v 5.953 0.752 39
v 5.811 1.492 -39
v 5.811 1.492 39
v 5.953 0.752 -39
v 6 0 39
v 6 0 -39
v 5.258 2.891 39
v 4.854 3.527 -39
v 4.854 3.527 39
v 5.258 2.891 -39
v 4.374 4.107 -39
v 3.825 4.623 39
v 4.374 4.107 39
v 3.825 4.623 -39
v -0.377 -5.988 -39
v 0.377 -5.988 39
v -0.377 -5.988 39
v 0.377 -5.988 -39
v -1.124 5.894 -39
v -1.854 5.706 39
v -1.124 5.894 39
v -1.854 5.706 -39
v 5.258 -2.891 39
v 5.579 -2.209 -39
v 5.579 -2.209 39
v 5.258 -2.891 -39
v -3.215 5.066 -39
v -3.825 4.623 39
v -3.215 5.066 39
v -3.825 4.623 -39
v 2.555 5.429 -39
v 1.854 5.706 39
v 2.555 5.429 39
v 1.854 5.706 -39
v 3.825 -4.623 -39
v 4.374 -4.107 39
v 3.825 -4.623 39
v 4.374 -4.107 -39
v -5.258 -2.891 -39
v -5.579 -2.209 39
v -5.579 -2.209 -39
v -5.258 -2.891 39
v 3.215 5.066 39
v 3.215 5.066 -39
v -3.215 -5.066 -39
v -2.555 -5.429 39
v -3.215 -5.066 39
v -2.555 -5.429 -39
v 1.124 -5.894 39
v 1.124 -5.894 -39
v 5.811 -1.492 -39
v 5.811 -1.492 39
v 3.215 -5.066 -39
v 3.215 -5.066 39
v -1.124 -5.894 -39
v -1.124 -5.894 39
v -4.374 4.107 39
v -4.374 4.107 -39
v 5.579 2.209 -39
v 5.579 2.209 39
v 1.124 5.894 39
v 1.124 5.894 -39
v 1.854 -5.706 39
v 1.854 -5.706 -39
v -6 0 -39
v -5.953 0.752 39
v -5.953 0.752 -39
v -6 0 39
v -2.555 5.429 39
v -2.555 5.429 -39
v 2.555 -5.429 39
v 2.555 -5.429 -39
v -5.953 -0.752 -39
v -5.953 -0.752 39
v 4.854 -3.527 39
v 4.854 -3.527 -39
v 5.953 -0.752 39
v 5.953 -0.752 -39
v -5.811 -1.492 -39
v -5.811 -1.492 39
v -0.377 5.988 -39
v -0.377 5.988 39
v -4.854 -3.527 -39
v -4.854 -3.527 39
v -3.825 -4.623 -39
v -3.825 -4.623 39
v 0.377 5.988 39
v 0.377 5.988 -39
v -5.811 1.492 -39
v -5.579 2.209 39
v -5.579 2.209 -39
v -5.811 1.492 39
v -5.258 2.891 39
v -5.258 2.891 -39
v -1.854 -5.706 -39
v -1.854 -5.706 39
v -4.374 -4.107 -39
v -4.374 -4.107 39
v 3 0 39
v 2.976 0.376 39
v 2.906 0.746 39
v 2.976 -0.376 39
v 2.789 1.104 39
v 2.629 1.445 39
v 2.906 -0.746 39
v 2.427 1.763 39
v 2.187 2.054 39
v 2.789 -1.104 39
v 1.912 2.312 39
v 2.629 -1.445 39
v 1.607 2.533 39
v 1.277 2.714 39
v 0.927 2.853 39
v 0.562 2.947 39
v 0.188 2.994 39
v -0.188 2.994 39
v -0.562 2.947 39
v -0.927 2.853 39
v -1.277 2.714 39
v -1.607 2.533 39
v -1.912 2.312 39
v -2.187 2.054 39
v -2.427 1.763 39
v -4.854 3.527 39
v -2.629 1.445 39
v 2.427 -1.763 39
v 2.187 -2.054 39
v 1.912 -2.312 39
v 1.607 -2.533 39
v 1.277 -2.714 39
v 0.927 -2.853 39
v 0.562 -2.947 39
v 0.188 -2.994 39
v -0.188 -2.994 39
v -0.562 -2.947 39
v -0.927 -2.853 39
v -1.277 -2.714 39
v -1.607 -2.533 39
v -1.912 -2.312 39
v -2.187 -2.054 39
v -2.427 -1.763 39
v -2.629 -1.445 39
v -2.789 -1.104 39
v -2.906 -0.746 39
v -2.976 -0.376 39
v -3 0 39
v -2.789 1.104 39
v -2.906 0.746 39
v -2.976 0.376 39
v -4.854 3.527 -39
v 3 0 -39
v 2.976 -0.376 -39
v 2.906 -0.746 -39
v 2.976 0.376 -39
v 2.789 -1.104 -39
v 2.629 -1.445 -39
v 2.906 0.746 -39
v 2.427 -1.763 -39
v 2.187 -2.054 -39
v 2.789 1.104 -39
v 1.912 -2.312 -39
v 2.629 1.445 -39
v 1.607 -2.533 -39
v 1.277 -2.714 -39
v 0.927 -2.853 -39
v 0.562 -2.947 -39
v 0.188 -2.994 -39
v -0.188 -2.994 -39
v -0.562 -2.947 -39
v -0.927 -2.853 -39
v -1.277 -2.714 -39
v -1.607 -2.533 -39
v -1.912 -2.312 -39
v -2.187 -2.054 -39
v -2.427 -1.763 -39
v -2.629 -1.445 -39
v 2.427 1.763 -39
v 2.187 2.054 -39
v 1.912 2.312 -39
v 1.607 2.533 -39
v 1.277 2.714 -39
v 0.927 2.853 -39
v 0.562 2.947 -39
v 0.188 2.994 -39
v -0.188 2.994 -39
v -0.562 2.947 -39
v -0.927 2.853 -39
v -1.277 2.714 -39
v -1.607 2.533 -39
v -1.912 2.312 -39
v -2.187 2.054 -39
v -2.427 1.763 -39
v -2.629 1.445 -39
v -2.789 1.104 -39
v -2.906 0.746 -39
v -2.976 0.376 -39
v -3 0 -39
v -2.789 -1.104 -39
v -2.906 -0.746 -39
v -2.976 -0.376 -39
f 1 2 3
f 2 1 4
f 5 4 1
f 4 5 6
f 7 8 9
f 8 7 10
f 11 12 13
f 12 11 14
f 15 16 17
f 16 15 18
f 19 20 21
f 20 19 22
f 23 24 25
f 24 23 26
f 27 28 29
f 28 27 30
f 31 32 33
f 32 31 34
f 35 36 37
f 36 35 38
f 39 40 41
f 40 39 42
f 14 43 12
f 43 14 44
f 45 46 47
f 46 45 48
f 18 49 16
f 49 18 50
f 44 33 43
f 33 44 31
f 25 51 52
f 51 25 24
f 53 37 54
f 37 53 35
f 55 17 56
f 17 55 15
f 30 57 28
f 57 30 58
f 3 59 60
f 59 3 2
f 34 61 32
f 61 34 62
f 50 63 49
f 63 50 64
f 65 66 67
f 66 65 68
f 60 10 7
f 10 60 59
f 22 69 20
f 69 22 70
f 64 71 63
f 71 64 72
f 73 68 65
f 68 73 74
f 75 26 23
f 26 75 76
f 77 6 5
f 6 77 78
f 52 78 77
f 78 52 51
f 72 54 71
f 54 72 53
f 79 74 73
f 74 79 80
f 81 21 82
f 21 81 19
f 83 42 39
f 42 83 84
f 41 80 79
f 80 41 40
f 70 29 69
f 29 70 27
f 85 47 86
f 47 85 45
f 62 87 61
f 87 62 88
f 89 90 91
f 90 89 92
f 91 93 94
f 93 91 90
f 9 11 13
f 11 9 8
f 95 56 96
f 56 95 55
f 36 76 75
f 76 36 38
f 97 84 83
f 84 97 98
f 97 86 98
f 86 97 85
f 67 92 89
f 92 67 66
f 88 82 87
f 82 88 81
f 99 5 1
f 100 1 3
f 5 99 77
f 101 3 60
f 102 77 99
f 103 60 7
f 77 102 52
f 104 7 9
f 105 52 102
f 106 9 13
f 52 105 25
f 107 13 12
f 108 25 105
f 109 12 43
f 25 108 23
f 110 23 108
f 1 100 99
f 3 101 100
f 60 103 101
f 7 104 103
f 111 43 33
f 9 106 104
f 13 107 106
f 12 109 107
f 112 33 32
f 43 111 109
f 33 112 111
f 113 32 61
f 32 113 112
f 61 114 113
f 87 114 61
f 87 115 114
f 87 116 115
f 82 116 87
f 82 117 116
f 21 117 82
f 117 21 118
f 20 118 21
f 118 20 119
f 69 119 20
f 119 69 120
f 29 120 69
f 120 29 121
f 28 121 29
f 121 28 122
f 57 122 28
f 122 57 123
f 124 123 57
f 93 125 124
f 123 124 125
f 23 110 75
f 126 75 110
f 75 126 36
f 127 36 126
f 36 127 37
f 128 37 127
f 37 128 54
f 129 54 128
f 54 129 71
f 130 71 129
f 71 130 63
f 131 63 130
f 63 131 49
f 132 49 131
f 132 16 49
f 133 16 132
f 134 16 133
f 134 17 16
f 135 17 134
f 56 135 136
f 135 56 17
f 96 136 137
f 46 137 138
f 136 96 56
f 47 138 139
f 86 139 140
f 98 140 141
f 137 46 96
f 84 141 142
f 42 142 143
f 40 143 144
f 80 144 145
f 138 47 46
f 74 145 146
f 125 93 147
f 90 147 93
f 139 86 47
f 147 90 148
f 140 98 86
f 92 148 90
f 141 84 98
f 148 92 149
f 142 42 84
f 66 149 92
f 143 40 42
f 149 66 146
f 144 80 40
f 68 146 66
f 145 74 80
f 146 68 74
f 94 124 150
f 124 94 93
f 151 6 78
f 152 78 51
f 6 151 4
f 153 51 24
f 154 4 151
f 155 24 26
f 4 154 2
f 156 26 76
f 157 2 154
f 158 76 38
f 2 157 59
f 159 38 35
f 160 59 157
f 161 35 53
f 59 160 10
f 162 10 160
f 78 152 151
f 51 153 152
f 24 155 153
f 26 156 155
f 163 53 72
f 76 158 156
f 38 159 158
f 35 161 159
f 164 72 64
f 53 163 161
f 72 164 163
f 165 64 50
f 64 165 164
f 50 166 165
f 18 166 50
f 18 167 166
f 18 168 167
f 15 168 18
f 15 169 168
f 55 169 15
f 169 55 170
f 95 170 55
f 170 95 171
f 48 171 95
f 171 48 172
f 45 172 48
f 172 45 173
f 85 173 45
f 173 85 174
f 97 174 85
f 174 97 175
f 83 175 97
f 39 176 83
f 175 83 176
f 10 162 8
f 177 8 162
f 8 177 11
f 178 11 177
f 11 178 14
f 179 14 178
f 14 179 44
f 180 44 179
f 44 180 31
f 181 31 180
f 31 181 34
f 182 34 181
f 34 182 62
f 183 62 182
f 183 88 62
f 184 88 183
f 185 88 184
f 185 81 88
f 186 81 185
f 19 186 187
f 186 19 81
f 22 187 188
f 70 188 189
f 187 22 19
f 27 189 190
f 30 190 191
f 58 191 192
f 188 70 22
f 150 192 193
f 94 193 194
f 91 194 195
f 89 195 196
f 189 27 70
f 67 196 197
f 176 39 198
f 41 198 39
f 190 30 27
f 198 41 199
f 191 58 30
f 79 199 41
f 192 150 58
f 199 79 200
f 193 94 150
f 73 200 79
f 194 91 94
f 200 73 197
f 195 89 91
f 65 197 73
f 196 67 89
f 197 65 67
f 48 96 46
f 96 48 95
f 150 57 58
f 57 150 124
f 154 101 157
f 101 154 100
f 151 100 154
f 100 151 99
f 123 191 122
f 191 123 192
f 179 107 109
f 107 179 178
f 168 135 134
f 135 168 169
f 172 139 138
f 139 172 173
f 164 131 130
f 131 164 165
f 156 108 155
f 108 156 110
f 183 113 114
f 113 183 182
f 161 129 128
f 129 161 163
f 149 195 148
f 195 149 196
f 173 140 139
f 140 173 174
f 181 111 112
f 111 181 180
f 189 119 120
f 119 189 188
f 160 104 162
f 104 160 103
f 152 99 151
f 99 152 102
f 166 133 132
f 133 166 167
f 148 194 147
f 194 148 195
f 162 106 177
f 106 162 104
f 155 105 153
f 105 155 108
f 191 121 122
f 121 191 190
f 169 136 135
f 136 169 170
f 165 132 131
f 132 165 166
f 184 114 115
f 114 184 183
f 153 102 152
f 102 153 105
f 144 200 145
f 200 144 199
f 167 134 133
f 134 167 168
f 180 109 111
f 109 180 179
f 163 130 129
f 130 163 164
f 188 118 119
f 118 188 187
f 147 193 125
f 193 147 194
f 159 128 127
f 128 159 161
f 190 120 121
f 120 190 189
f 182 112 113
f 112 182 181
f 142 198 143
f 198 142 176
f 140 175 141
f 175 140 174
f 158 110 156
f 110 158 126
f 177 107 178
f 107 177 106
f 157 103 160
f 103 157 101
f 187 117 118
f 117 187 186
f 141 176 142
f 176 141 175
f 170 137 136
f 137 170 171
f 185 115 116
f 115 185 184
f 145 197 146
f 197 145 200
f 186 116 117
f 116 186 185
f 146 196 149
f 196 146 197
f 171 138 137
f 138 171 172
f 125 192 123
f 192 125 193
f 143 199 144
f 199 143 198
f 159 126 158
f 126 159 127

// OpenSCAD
$fn = 50;


difference() {
	union() {
		translate(v = [0, 0, -39.0000000000]) {
			cylinder(h = 78, r = 6.0000000000);
		}
	}
	union() {
		translate(v = [0, 0, -100.0000000000]) {
			cylinder(h = 200, r = 3.0000000000);
		}
	}
}
